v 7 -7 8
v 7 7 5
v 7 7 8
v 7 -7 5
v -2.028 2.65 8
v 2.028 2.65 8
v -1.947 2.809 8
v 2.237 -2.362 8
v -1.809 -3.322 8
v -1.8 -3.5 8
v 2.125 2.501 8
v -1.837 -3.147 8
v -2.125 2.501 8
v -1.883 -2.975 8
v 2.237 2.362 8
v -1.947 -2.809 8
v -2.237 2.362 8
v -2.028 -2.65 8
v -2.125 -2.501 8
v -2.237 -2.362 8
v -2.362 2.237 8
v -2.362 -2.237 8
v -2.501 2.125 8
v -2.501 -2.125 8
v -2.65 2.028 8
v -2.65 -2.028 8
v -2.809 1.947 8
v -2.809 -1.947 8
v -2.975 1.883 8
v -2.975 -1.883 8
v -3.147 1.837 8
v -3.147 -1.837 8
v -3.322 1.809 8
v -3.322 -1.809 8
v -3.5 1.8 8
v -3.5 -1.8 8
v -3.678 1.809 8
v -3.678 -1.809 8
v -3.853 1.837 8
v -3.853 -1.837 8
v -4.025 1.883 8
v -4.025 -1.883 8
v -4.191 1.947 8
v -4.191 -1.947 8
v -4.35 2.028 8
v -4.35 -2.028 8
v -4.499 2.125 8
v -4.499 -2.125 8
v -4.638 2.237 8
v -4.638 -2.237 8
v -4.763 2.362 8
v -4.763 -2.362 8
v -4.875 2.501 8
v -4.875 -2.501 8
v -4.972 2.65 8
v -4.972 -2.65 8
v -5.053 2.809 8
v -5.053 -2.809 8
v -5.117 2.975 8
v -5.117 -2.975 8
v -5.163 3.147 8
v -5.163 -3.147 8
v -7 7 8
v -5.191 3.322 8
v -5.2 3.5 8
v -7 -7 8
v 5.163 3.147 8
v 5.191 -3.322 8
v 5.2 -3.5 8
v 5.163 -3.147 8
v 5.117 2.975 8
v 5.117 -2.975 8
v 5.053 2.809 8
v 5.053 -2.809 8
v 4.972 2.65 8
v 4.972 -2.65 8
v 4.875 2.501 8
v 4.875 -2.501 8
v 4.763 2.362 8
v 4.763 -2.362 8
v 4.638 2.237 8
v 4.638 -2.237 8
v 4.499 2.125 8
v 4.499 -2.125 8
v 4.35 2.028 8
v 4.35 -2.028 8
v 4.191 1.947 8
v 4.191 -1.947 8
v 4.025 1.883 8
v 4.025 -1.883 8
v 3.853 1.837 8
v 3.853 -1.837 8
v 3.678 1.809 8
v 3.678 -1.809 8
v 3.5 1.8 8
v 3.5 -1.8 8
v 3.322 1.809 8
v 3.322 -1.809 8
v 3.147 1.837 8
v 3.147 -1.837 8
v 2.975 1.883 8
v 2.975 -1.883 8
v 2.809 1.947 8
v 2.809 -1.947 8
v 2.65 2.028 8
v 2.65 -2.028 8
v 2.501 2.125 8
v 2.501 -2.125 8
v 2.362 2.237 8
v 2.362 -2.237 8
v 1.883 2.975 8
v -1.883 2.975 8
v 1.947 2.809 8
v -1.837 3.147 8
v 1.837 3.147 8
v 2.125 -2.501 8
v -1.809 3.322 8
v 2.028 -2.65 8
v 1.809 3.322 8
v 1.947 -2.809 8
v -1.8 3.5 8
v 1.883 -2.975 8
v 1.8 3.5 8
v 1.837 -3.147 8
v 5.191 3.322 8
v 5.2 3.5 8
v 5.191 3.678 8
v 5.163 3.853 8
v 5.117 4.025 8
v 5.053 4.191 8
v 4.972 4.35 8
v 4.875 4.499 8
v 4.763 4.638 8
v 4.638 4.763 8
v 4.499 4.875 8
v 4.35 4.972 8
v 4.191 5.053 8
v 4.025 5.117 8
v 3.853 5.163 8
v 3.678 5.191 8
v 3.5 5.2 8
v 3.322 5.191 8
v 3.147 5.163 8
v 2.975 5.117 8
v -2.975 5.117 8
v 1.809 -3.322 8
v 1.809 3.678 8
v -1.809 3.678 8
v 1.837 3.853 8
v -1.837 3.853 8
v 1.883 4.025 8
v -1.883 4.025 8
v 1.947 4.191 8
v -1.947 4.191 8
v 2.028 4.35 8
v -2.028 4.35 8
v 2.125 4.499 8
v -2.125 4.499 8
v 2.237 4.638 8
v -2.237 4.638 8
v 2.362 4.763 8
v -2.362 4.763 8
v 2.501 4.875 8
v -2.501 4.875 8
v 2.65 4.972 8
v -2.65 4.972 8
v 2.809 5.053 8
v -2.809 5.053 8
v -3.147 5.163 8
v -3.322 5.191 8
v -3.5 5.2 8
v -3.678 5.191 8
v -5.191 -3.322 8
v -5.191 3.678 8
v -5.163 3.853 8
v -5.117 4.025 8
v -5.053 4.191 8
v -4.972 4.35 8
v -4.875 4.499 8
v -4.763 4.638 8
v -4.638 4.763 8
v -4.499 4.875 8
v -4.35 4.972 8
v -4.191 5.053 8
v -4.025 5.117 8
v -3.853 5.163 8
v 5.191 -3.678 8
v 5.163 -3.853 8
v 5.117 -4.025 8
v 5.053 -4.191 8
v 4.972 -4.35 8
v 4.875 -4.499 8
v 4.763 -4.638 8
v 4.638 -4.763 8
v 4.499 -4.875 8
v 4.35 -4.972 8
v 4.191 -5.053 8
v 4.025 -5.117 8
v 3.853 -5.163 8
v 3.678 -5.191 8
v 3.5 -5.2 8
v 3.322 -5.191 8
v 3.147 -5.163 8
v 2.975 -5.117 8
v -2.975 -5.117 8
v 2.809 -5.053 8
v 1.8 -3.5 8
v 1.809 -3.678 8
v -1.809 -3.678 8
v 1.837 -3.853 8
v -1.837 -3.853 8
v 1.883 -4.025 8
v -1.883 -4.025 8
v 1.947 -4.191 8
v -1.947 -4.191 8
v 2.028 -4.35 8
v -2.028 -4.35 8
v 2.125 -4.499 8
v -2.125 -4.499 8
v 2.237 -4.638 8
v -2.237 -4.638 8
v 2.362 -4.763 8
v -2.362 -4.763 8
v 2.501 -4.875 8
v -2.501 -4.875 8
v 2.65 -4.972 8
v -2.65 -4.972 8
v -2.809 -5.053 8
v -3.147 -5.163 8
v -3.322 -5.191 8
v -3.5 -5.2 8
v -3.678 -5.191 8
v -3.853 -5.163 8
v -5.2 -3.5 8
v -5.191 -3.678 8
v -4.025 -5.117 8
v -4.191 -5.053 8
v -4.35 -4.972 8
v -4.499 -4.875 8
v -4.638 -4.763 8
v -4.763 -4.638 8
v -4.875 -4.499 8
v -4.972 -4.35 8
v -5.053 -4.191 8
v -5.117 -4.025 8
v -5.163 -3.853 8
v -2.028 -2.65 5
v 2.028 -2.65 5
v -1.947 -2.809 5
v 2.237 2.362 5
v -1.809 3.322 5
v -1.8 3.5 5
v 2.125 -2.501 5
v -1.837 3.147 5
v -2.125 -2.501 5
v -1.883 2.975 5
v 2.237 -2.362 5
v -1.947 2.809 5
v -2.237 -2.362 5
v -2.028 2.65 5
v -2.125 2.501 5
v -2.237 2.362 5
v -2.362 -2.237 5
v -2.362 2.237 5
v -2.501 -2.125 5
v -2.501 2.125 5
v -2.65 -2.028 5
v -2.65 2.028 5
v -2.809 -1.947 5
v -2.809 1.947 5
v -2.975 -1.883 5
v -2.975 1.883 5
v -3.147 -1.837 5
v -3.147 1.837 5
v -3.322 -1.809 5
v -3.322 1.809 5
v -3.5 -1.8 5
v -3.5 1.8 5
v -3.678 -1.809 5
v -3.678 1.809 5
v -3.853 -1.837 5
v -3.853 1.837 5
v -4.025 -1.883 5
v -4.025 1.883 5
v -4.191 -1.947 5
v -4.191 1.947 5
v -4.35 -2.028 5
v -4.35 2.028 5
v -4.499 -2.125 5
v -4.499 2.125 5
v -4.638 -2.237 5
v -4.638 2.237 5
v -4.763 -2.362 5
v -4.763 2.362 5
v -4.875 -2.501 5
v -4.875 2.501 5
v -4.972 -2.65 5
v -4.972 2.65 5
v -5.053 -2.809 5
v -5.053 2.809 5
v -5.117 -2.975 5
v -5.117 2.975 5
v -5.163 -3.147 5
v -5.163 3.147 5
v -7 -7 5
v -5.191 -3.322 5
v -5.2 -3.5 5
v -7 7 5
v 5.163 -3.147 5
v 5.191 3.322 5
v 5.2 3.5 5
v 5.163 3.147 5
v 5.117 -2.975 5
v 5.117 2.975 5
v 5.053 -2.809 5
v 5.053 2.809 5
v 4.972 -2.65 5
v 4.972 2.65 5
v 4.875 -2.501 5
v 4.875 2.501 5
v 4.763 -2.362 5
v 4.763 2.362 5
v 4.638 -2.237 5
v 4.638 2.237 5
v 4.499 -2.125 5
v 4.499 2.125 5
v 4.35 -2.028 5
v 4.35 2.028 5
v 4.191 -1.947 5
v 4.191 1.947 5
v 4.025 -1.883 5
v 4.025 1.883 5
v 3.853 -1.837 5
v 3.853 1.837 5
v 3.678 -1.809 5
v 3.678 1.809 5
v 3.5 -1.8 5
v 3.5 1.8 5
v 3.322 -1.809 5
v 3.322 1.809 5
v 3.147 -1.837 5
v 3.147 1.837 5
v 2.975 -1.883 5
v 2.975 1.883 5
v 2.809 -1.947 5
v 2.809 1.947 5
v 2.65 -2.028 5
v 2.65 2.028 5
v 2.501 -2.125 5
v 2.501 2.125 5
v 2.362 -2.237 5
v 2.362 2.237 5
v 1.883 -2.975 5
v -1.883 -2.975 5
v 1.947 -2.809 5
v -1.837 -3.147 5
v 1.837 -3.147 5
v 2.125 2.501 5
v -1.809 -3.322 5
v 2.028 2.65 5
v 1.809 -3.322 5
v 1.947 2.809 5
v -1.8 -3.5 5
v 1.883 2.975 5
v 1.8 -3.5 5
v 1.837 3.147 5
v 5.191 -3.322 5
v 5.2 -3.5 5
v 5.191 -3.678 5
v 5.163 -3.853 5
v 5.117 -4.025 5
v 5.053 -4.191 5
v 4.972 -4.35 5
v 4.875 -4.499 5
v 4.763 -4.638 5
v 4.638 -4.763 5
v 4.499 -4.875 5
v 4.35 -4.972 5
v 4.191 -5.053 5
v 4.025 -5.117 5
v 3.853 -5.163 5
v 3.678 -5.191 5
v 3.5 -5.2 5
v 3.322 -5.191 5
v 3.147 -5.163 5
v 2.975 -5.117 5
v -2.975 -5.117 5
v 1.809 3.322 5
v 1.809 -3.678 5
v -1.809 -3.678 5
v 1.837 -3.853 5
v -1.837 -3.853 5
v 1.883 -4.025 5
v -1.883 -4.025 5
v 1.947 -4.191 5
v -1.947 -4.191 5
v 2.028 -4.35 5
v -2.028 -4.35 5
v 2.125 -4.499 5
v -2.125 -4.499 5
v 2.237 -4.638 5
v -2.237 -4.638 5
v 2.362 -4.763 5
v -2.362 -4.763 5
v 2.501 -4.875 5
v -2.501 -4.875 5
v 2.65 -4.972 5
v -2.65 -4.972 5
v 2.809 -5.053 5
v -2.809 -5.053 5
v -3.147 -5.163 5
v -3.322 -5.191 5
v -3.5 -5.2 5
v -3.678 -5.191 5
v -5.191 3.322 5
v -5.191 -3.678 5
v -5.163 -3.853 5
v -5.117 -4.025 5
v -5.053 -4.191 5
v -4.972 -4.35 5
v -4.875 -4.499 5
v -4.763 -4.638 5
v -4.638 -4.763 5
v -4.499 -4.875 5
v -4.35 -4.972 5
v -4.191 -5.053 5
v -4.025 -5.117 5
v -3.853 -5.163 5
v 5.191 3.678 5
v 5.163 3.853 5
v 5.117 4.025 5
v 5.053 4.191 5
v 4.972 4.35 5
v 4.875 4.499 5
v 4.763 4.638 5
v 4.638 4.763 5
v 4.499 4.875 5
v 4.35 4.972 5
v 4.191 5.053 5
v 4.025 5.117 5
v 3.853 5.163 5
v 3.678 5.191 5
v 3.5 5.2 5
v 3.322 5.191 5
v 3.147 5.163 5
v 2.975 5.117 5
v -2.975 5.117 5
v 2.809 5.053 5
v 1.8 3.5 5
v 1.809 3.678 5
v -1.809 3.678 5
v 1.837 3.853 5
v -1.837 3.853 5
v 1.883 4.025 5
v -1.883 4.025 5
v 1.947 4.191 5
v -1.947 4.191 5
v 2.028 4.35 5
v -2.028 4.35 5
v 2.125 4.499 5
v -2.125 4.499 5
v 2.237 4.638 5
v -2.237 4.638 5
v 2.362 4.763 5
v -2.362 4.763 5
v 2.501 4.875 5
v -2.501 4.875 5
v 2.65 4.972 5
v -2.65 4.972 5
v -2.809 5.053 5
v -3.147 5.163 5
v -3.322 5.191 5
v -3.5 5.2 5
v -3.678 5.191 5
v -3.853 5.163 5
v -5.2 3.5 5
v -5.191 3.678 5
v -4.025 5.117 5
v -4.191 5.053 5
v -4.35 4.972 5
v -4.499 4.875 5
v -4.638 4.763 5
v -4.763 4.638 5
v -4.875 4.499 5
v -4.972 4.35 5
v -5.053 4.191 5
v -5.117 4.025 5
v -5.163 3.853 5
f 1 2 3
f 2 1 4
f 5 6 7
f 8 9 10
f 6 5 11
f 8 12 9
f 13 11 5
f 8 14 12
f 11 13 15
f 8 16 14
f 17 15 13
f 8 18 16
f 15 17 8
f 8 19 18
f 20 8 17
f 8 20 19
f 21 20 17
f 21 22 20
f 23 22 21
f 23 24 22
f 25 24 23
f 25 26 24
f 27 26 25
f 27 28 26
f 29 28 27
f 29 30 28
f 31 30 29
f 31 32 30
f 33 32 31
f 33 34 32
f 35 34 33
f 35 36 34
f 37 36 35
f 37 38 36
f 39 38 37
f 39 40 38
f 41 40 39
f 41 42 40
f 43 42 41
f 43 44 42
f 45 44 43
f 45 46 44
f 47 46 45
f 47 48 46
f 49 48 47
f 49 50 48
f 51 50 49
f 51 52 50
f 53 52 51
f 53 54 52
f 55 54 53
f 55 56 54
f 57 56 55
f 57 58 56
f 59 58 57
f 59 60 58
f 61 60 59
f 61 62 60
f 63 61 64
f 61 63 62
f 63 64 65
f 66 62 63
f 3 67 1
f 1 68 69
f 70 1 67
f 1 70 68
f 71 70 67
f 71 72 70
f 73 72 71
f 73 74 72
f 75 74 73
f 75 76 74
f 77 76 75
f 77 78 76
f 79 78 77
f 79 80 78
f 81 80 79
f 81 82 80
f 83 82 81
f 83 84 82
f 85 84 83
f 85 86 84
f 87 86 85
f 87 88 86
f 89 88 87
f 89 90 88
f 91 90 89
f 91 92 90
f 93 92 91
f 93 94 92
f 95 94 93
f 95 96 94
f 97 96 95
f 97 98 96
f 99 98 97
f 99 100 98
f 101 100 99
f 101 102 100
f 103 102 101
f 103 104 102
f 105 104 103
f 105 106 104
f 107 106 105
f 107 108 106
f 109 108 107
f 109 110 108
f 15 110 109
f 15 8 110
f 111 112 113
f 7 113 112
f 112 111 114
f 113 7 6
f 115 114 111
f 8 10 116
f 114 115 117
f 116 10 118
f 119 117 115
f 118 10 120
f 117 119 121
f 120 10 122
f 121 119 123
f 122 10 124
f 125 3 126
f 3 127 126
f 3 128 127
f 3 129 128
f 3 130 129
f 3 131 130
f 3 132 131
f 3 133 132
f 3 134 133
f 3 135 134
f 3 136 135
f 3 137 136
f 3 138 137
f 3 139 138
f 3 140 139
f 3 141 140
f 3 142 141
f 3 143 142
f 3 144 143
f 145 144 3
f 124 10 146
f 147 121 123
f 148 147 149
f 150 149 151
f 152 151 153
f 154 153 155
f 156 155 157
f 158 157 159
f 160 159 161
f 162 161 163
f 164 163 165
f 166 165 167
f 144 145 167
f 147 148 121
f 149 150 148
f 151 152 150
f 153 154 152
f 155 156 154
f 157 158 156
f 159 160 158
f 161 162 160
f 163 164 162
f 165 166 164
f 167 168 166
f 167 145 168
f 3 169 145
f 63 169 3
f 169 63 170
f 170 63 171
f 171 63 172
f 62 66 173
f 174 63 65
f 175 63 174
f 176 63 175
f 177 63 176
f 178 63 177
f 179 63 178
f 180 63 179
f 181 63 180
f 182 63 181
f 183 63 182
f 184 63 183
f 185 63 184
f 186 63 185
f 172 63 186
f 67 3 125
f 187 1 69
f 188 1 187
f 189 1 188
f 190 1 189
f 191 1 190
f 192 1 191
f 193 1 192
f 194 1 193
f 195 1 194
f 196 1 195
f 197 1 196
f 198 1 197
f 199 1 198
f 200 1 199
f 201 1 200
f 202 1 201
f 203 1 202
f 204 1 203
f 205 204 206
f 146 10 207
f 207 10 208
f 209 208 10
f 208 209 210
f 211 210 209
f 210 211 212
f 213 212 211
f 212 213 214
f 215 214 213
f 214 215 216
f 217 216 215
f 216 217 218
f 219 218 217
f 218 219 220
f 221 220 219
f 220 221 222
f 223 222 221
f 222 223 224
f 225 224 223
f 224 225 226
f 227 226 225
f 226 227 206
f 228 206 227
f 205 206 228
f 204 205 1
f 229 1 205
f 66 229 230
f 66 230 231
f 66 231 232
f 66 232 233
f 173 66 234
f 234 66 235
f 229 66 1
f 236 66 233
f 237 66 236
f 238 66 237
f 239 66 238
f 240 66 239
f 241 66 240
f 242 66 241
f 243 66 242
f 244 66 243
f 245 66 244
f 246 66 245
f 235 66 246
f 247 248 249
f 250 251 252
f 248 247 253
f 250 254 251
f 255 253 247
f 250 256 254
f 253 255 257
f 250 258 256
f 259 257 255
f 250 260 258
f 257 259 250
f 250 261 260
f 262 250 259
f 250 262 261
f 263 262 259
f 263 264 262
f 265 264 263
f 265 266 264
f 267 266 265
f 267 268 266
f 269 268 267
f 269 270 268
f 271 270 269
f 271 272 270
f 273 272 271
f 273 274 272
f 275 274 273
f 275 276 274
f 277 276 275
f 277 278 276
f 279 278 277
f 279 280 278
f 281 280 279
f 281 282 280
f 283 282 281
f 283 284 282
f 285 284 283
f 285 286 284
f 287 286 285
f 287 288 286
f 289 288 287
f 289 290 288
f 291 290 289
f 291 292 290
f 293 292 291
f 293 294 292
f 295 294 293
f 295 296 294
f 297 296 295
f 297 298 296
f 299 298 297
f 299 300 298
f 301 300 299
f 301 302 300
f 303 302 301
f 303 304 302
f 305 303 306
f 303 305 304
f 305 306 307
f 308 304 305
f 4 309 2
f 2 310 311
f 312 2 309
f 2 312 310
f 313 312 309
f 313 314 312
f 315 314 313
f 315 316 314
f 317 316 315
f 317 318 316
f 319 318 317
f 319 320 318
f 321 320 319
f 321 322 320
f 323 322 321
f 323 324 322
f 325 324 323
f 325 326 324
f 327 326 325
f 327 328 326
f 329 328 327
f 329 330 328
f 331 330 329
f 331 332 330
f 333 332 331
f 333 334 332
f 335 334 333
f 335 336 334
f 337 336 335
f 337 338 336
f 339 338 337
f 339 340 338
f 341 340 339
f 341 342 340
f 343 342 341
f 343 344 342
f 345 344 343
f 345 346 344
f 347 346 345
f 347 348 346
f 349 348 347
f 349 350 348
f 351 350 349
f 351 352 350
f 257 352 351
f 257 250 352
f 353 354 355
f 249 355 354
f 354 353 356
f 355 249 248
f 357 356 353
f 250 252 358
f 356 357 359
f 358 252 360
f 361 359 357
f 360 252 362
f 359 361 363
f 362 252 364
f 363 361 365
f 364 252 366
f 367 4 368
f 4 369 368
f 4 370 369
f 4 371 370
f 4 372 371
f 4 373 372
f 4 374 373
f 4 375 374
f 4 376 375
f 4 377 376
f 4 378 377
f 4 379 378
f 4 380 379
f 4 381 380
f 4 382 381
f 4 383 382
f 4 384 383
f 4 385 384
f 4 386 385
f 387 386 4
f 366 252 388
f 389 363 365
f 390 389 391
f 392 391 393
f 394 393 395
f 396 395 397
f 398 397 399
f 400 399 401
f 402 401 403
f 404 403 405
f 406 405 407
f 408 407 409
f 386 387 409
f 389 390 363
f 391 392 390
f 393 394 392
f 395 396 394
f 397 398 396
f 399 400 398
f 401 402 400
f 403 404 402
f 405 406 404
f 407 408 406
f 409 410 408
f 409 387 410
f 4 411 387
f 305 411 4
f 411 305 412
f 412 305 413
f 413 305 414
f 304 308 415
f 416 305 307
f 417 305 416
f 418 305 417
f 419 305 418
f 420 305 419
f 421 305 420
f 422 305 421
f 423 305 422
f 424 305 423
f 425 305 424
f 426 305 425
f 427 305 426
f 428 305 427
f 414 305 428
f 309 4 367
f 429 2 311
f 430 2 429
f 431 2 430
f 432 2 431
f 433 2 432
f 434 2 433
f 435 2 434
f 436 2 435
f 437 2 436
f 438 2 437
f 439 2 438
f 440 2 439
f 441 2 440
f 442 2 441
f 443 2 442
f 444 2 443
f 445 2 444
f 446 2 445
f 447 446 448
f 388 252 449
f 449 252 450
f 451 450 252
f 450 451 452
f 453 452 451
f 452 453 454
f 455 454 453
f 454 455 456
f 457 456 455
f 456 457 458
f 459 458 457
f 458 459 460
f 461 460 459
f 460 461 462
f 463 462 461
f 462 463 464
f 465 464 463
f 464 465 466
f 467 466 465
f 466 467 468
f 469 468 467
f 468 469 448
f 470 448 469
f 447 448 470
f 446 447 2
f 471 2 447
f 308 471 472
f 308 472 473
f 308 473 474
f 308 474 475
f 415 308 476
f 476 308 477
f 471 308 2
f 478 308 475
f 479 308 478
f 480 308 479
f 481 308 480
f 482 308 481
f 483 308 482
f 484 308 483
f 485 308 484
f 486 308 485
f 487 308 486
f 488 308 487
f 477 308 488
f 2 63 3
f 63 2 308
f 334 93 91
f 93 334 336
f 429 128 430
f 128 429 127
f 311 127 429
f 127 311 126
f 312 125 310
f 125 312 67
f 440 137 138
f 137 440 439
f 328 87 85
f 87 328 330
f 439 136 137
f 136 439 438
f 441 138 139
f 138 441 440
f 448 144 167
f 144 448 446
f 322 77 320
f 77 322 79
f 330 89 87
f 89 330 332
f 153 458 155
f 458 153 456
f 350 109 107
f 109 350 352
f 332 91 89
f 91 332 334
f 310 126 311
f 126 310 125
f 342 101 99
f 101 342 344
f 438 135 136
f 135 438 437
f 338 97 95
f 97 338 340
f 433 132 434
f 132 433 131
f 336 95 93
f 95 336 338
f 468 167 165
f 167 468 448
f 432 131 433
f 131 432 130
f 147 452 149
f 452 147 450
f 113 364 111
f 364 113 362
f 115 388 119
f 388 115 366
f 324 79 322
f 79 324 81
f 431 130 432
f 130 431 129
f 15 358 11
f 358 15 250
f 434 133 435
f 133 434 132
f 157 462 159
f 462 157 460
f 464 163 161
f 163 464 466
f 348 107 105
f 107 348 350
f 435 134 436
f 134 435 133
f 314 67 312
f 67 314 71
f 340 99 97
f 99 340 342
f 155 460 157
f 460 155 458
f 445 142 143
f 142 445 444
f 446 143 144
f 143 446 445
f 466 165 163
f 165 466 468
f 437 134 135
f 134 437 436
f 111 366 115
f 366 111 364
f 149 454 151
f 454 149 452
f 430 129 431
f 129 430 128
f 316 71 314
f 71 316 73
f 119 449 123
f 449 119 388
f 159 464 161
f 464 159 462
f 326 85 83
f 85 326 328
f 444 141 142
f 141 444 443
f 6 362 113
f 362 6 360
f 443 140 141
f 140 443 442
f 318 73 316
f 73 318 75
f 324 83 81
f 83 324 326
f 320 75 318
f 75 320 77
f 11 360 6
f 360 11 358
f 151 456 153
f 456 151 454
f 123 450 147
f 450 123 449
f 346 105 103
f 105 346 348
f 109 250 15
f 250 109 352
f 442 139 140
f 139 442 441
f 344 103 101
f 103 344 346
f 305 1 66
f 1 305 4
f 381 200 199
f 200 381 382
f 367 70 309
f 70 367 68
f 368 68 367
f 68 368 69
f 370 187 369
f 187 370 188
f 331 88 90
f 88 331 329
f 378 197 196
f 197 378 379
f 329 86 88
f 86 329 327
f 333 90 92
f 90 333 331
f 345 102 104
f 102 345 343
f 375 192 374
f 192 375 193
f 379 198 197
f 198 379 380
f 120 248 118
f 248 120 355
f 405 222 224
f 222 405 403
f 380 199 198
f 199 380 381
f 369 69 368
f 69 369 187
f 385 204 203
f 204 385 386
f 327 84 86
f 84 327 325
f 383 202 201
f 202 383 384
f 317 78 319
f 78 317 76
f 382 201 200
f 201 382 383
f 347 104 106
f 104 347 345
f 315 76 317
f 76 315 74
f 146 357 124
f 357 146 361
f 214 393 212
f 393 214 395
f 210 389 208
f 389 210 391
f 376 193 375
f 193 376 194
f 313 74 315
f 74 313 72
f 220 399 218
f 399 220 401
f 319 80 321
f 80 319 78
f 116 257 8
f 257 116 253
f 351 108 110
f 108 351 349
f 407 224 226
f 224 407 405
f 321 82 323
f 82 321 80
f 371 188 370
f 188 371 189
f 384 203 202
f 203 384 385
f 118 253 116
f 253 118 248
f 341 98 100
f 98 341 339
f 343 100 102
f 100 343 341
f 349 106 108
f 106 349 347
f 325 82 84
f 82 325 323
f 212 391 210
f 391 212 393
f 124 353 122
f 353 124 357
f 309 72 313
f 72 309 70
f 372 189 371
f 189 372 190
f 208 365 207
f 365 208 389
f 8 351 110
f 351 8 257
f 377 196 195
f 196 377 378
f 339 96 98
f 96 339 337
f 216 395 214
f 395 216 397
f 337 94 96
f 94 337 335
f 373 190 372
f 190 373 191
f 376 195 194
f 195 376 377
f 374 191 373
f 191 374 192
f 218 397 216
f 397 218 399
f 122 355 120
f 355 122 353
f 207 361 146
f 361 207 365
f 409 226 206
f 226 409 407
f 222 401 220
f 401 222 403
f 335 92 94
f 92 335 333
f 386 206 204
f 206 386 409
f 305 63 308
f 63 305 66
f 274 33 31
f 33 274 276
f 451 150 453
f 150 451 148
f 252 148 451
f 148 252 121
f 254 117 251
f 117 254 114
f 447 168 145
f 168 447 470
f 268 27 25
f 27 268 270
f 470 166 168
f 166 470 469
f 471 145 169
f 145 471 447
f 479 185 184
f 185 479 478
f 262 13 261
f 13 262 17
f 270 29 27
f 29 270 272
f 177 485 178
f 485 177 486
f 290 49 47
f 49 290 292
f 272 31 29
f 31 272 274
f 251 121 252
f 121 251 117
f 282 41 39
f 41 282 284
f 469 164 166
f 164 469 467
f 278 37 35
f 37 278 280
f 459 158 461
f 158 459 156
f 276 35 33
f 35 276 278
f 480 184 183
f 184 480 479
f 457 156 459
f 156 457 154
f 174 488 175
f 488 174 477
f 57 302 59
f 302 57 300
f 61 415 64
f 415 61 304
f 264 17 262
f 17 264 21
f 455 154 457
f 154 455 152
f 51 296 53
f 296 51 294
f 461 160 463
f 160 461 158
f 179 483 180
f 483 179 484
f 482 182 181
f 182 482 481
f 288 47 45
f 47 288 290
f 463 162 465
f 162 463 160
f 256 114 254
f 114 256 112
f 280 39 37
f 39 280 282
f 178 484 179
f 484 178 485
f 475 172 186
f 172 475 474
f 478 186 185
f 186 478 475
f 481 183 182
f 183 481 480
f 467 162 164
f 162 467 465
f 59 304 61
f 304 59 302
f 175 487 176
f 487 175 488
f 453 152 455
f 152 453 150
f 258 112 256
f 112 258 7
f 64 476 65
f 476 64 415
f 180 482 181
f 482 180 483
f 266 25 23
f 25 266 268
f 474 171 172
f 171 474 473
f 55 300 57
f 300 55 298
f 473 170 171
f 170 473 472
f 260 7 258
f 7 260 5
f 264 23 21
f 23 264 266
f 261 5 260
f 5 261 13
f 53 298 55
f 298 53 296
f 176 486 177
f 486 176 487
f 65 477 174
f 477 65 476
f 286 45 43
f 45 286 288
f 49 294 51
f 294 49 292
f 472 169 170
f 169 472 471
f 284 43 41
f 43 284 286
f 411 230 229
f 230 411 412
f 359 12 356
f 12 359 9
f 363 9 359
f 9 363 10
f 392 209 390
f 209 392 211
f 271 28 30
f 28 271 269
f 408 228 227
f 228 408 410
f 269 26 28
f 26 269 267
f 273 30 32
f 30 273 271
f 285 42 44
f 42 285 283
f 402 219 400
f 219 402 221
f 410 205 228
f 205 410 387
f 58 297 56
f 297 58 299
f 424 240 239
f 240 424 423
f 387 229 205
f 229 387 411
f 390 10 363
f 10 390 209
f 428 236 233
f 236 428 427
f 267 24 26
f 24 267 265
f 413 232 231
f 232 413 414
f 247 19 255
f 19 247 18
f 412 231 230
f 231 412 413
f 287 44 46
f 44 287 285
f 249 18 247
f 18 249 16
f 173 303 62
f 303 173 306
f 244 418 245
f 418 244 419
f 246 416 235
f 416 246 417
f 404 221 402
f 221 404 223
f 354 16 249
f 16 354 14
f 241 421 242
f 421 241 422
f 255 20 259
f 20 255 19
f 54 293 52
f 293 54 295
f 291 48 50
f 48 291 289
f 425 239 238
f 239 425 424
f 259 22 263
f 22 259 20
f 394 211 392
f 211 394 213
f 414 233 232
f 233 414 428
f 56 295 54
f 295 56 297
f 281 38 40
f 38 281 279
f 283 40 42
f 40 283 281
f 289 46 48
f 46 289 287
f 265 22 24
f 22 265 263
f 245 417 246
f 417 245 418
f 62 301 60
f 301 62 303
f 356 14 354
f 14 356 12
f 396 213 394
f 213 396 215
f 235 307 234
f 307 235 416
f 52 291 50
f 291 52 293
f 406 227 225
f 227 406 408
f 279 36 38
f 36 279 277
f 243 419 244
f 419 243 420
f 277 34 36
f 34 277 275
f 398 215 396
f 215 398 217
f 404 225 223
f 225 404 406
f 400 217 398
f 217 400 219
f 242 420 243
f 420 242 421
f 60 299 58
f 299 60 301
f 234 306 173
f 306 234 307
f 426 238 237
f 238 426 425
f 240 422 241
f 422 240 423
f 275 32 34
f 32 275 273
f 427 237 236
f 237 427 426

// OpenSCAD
FastenerHoleMounts();

module FastenerHoleMounts(
	baseSize		= [10,10,10],
	mountSize	= [7,7,3],
	offsetX		= 5,
	offsetY		= 5,
	offsetZ		= 0,
	holeRadius	= 1.7,
	holeDepth	= 3
)
{
	xPos = baseSize[0]/2 - mountSize[0]/2 - offsetX;
	yPos = baseSize[1]/2 - mountSize[1]/2 - offsetY;
	zPos = baseSize[2]/2 + mountSize[2]/2 + offsetZ;

	// create four mounts, one at each corner of the plate
	for( x=[-1,1], y=[-1,1])
	{
		translate([	xPos * x, yPos * y, zPos])
			difference(){
				cube(mountSize,center=true);
				#translate([0, 0, -mountSize[2]/2 + holeDepth/2 - 0.1])
					cylinder(h=holeDepth * 2, r=holeRadius, center=true, $fn=60);
			} // difference
	} // for loop
}
